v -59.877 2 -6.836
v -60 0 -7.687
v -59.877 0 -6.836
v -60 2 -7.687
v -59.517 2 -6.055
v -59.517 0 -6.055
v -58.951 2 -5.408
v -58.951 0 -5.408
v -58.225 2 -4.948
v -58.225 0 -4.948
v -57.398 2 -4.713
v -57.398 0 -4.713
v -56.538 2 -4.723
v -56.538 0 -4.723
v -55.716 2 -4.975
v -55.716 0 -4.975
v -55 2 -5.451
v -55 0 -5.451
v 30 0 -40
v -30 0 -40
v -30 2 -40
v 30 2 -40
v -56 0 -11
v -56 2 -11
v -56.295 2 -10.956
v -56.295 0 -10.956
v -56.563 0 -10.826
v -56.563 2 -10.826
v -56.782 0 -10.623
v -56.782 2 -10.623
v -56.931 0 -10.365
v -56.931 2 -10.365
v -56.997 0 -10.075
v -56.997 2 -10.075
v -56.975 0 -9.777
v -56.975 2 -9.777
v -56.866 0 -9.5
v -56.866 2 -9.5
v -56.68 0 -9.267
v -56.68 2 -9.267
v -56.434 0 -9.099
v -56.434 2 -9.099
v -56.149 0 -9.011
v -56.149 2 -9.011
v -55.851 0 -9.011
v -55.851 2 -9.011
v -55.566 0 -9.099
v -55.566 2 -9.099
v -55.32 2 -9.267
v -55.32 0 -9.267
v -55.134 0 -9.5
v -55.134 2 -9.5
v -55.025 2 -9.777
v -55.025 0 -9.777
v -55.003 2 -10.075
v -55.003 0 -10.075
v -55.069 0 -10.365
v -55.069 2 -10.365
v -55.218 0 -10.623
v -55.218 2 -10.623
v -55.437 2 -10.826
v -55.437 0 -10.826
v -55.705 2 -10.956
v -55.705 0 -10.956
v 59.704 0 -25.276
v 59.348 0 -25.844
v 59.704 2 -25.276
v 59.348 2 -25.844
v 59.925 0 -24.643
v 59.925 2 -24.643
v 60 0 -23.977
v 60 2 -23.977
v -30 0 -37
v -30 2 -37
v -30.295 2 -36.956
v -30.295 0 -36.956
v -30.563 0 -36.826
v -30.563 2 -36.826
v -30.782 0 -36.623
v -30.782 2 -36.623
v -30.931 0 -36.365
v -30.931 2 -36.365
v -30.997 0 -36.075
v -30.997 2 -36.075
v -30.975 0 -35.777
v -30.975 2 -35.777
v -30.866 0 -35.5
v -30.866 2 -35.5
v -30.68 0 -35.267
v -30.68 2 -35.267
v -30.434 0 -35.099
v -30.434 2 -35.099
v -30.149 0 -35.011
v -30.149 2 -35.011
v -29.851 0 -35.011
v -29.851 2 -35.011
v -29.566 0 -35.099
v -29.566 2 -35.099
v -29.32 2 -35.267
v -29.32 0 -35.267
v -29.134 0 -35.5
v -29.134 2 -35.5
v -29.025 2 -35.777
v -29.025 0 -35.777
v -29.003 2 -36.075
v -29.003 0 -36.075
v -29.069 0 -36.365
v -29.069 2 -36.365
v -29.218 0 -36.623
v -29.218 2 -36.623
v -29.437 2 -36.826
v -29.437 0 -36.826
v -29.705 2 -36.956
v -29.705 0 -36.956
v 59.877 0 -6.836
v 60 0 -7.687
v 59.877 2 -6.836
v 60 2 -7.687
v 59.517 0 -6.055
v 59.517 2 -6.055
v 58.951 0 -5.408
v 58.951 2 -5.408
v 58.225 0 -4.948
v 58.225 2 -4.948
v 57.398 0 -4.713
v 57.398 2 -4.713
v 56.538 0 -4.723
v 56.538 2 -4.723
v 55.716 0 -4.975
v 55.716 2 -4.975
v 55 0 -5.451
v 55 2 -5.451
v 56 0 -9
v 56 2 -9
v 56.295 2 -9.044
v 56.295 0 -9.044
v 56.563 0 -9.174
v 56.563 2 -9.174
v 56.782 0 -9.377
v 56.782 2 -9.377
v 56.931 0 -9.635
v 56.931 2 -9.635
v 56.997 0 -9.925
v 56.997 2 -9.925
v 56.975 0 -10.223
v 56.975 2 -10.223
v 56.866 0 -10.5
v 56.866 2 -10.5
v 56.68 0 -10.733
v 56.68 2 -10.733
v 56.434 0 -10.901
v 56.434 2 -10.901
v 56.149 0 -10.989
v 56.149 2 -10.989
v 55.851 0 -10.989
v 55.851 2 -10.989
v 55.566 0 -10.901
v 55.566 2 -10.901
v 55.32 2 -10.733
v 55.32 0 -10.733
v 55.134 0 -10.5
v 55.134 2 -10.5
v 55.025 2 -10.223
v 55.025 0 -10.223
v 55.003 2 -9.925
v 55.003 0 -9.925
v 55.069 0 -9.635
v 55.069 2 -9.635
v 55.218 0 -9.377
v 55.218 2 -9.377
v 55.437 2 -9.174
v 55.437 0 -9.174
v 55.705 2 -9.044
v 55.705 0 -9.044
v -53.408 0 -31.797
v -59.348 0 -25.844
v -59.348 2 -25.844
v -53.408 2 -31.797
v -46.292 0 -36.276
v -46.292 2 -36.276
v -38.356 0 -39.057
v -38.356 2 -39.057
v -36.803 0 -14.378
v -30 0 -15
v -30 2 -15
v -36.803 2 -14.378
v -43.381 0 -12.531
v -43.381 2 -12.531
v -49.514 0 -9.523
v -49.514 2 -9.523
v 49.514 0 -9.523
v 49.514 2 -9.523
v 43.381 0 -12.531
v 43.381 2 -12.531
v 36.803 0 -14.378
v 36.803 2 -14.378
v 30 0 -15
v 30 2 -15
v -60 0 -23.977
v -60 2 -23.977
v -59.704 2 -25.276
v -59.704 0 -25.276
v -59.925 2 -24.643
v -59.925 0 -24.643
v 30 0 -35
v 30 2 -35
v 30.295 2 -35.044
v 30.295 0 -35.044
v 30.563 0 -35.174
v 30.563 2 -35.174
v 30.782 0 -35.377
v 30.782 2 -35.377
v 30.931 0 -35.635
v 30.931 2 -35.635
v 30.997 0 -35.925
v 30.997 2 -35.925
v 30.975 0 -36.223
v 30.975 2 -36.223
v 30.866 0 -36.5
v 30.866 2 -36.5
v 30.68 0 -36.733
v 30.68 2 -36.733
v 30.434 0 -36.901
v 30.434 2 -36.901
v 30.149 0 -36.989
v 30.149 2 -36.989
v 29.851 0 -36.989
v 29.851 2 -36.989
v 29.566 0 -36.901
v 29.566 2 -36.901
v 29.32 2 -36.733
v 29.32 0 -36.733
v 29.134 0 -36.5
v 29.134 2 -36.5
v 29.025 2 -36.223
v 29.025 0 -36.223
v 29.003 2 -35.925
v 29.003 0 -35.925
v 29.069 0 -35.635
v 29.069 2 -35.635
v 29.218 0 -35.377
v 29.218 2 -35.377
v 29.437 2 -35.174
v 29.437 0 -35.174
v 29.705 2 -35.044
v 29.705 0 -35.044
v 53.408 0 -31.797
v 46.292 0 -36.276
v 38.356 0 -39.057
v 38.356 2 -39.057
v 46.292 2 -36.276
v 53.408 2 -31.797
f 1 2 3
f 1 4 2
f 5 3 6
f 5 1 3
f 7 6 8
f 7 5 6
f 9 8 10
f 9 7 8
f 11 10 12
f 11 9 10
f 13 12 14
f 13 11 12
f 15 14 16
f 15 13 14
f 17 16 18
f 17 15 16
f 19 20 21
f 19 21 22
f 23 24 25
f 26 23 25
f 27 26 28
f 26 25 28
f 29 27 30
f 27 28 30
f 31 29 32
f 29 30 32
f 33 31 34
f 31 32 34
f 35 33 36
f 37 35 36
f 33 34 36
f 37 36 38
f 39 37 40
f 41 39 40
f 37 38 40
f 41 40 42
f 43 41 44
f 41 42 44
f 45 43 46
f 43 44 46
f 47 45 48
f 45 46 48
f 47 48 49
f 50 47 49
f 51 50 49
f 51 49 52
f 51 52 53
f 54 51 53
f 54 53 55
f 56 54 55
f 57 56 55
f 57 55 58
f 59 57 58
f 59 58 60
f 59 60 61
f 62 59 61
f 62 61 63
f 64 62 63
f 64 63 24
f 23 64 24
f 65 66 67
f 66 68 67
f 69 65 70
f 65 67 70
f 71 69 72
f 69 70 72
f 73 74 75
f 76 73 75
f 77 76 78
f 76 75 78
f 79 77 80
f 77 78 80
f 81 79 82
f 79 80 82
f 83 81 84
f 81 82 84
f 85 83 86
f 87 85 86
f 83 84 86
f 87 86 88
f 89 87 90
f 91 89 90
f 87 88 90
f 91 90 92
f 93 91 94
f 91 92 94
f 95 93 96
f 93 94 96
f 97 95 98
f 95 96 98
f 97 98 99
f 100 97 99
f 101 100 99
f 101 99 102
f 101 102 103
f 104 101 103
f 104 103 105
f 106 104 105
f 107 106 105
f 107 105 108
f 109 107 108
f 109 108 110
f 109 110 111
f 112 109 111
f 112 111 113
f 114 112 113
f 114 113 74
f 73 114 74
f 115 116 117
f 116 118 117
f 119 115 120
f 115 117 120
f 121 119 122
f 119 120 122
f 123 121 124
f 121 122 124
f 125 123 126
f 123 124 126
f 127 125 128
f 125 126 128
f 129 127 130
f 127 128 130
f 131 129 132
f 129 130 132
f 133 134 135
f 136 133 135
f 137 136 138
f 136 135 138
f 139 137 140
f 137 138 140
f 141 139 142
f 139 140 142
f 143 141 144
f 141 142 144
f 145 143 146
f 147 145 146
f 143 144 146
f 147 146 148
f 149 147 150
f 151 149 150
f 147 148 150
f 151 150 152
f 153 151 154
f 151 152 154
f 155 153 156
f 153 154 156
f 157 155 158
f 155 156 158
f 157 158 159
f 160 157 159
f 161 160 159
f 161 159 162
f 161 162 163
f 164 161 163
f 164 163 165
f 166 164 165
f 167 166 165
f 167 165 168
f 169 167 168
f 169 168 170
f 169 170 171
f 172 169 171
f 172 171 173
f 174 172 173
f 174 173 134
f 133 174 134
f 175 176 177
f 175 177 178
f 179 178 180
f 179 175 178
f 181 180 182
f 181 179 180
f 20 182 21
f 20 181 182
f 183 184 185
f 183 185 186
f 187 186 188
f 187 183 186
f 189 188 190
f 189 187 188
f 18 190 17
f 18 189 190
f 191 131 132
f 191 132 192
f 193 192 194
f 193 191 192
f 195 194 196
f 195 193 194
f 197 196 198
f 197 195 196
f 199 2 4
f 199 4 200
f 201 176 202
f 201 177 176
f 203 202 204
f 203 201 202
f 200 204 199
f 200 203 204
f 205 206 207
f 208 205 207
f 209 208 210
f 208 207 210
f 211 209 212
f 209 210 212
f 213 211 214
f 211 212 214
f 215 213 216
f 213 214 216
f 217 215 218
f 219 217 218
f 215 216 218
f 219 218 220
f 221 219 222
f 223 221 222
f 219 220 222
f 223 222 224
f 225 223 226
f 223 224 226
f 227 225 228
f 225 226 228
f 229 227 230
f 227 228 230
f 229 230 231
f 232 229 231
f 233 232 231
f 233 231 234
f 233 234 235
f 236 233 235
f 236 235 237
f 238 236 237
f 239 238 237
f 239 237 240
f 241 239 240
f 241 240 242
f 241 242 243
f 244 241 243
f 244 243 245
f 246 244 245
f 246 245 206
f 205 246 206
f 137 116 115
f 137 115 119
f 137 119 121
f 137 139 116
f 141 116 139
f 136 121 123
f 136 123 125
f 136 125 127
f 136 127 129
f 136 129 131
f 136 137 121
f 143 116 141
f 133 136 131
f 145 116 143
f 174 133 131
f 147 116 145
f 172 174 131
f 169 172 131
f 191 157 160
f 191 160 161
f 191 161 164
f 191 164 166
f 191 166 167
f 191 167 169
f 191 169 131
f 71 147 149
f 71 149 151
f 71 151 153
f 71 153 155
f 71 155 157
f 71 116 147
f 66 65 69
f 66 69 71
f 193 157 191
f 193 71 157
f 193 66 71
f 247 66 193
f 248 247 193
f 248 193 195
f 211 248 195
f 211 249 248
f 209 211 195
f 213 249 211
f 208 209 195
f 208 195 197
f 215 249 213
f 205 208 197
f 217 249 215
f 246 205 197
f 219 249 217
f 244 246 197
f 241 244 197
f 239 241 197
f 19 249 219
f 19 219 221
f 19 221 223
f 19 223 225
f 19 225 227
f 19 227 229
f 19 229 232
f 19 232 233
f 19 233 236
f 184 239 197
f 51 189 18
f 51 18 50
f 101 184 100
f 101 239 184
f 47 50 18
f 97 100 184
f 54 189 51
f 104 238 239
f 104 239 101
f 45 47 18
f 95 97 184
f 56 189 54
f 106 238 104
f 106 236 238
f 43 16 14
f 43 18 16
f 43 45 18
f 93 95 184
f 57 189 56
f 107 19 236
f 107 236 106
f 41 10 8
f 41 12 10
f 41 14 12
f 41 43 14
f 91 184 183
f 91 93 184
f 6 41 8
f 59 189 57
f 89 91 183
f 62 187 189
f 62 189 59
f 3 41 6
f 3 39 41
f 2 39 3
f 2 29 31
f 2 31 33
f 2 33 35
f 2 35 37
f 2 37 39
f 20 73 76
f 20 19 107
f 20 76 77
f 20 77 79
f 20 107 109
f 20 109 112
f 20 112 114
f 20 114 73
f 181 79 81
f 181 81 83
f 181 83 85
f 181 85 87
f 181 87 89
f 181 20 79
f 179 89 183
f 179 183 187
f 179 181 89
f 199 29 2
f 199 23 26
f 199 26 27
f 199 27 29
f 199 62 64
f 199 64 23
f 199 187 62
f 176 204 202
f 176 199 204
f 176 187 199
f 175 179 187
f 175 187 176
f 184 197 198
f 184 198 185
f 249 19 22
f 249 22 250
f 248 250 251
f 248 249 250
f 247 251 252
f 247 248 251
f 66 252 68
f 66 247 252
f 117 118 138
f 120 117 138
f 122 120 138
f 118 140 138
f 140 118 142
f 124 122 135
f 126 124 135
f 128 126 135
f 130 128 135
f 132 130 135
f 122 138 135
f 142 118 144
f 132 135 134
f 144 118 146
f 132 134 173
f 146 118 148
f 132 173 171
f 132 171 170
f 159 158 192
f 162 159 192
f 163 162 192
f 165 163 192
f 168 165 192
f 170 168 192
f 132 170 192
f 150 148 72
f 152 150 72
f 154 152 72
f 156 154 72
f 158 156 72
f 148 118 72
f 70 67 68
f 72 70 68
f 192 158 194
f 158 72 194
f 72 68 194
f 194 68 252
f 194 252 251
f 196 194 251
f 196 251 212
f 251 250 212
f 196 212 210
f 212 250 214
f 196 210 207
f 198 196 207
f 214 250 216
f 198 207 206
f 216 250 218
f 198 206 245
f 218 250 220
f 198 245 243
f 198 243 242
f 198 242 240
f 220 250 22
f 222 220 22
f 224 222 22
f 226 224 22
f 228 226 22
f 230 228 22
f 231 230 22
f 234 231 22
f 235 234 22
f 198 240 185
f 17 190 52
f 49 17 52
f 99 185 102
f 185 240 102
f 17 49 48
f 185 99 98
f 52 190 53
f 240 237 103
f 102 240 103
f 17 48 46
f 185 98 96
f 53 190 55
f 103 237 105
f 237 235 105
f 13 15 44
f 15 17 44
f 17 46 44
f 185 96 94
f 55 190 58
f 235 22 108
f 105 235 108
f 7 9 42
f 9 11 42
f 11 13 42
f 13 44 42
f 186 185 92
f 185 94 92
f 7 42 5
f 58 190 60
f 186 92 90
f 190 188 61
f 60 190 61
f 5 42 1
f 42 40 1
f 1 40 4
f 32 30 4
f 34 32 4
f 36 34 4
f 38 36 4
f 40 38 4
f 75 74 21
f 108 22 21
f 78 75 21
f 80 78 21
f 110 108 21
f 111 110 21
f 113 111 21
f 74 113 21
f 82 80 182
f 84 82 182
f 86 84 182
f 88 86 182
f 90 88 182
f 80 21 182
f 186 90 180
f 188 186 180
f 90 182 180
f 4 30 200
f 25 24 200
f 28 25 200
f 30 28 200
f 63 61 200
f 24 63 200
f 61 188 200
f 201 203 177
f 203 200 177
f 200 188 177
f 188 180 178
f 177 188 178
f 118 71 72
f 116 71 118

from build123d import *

# Parameters (mm, degrees)
BOSS_EXTRUDE1_DEPTH = 2
SKETCH2_R           = 1
CUT_EXTRUDE1_DEPTH  = 3
FILLET2_R           = 3


with BuildPart() as part:
    # Sketch1 → Boss-Extrude1 (new body)
    with BuildSketch(Plane(origin=(0, 0, 0), x_dir=(1, 0, 0), z_dir=(0, 1, 0))):
        with BuildLine():
            Line((-30, 40), (30, 40))
            ThreePointArc((30, 40), (46.770509831, 36.041019662), (60, 25))
            Line((60, 25), (60, 0))
            ThreePointArc((60, 0), (46.770509831, 11.041019662), (30, 15))
            Line((30, 15), (-30, 15))
            ThreePointArc((-30, 15), (-46.770509831, 11.041019662), (-60, 0))
            Line((-60, 0), (-60, 25))
            ThreePointArc((-60, 25), (-46.770509831, 36.041019662), (-30, 40))
        make_face()
    extrude(amount=BOSS_EXTRUDE1_DEPTH)

    # Sketch2 → Cut-Extrude1 (cut)
    with BuildSketch(Plane(origin=(0, 2, 0), x_dir=(1, 0, 0), z_dir=(0, 1, 0))):
        with Locations(Location((56, 10, 0), (0, 0, 270))):
            Circle(SKETCH2_R)
        with Locations(Location((30, 36, 0), (0, 0, 270))):
            Circle(SKETCH2_R)
        with Locations(Location((-56, 10, 0), (0, 0, 90))):
            Circle(SKETCH2_R)
        with Locations(Location((-30, 36, 0), (0, 0, 90))):
            Circle(SKETCH2_R)
    extrude(amount=-CUT_EXTRUDE1_DEPTH, mode=Mode.SUBTRACT)

    # Fillet2
    fillet2_edges = [part.edges().sort_by_distance(p)[0] for p in [
        (-60, 1, 0),
        (-60, 1, -25),
        (60, 1, -25),
        (60, 1, 0),
    ]]
    fillet(fillet2_edges, radius=FILLET2_R)


solid = part.part
